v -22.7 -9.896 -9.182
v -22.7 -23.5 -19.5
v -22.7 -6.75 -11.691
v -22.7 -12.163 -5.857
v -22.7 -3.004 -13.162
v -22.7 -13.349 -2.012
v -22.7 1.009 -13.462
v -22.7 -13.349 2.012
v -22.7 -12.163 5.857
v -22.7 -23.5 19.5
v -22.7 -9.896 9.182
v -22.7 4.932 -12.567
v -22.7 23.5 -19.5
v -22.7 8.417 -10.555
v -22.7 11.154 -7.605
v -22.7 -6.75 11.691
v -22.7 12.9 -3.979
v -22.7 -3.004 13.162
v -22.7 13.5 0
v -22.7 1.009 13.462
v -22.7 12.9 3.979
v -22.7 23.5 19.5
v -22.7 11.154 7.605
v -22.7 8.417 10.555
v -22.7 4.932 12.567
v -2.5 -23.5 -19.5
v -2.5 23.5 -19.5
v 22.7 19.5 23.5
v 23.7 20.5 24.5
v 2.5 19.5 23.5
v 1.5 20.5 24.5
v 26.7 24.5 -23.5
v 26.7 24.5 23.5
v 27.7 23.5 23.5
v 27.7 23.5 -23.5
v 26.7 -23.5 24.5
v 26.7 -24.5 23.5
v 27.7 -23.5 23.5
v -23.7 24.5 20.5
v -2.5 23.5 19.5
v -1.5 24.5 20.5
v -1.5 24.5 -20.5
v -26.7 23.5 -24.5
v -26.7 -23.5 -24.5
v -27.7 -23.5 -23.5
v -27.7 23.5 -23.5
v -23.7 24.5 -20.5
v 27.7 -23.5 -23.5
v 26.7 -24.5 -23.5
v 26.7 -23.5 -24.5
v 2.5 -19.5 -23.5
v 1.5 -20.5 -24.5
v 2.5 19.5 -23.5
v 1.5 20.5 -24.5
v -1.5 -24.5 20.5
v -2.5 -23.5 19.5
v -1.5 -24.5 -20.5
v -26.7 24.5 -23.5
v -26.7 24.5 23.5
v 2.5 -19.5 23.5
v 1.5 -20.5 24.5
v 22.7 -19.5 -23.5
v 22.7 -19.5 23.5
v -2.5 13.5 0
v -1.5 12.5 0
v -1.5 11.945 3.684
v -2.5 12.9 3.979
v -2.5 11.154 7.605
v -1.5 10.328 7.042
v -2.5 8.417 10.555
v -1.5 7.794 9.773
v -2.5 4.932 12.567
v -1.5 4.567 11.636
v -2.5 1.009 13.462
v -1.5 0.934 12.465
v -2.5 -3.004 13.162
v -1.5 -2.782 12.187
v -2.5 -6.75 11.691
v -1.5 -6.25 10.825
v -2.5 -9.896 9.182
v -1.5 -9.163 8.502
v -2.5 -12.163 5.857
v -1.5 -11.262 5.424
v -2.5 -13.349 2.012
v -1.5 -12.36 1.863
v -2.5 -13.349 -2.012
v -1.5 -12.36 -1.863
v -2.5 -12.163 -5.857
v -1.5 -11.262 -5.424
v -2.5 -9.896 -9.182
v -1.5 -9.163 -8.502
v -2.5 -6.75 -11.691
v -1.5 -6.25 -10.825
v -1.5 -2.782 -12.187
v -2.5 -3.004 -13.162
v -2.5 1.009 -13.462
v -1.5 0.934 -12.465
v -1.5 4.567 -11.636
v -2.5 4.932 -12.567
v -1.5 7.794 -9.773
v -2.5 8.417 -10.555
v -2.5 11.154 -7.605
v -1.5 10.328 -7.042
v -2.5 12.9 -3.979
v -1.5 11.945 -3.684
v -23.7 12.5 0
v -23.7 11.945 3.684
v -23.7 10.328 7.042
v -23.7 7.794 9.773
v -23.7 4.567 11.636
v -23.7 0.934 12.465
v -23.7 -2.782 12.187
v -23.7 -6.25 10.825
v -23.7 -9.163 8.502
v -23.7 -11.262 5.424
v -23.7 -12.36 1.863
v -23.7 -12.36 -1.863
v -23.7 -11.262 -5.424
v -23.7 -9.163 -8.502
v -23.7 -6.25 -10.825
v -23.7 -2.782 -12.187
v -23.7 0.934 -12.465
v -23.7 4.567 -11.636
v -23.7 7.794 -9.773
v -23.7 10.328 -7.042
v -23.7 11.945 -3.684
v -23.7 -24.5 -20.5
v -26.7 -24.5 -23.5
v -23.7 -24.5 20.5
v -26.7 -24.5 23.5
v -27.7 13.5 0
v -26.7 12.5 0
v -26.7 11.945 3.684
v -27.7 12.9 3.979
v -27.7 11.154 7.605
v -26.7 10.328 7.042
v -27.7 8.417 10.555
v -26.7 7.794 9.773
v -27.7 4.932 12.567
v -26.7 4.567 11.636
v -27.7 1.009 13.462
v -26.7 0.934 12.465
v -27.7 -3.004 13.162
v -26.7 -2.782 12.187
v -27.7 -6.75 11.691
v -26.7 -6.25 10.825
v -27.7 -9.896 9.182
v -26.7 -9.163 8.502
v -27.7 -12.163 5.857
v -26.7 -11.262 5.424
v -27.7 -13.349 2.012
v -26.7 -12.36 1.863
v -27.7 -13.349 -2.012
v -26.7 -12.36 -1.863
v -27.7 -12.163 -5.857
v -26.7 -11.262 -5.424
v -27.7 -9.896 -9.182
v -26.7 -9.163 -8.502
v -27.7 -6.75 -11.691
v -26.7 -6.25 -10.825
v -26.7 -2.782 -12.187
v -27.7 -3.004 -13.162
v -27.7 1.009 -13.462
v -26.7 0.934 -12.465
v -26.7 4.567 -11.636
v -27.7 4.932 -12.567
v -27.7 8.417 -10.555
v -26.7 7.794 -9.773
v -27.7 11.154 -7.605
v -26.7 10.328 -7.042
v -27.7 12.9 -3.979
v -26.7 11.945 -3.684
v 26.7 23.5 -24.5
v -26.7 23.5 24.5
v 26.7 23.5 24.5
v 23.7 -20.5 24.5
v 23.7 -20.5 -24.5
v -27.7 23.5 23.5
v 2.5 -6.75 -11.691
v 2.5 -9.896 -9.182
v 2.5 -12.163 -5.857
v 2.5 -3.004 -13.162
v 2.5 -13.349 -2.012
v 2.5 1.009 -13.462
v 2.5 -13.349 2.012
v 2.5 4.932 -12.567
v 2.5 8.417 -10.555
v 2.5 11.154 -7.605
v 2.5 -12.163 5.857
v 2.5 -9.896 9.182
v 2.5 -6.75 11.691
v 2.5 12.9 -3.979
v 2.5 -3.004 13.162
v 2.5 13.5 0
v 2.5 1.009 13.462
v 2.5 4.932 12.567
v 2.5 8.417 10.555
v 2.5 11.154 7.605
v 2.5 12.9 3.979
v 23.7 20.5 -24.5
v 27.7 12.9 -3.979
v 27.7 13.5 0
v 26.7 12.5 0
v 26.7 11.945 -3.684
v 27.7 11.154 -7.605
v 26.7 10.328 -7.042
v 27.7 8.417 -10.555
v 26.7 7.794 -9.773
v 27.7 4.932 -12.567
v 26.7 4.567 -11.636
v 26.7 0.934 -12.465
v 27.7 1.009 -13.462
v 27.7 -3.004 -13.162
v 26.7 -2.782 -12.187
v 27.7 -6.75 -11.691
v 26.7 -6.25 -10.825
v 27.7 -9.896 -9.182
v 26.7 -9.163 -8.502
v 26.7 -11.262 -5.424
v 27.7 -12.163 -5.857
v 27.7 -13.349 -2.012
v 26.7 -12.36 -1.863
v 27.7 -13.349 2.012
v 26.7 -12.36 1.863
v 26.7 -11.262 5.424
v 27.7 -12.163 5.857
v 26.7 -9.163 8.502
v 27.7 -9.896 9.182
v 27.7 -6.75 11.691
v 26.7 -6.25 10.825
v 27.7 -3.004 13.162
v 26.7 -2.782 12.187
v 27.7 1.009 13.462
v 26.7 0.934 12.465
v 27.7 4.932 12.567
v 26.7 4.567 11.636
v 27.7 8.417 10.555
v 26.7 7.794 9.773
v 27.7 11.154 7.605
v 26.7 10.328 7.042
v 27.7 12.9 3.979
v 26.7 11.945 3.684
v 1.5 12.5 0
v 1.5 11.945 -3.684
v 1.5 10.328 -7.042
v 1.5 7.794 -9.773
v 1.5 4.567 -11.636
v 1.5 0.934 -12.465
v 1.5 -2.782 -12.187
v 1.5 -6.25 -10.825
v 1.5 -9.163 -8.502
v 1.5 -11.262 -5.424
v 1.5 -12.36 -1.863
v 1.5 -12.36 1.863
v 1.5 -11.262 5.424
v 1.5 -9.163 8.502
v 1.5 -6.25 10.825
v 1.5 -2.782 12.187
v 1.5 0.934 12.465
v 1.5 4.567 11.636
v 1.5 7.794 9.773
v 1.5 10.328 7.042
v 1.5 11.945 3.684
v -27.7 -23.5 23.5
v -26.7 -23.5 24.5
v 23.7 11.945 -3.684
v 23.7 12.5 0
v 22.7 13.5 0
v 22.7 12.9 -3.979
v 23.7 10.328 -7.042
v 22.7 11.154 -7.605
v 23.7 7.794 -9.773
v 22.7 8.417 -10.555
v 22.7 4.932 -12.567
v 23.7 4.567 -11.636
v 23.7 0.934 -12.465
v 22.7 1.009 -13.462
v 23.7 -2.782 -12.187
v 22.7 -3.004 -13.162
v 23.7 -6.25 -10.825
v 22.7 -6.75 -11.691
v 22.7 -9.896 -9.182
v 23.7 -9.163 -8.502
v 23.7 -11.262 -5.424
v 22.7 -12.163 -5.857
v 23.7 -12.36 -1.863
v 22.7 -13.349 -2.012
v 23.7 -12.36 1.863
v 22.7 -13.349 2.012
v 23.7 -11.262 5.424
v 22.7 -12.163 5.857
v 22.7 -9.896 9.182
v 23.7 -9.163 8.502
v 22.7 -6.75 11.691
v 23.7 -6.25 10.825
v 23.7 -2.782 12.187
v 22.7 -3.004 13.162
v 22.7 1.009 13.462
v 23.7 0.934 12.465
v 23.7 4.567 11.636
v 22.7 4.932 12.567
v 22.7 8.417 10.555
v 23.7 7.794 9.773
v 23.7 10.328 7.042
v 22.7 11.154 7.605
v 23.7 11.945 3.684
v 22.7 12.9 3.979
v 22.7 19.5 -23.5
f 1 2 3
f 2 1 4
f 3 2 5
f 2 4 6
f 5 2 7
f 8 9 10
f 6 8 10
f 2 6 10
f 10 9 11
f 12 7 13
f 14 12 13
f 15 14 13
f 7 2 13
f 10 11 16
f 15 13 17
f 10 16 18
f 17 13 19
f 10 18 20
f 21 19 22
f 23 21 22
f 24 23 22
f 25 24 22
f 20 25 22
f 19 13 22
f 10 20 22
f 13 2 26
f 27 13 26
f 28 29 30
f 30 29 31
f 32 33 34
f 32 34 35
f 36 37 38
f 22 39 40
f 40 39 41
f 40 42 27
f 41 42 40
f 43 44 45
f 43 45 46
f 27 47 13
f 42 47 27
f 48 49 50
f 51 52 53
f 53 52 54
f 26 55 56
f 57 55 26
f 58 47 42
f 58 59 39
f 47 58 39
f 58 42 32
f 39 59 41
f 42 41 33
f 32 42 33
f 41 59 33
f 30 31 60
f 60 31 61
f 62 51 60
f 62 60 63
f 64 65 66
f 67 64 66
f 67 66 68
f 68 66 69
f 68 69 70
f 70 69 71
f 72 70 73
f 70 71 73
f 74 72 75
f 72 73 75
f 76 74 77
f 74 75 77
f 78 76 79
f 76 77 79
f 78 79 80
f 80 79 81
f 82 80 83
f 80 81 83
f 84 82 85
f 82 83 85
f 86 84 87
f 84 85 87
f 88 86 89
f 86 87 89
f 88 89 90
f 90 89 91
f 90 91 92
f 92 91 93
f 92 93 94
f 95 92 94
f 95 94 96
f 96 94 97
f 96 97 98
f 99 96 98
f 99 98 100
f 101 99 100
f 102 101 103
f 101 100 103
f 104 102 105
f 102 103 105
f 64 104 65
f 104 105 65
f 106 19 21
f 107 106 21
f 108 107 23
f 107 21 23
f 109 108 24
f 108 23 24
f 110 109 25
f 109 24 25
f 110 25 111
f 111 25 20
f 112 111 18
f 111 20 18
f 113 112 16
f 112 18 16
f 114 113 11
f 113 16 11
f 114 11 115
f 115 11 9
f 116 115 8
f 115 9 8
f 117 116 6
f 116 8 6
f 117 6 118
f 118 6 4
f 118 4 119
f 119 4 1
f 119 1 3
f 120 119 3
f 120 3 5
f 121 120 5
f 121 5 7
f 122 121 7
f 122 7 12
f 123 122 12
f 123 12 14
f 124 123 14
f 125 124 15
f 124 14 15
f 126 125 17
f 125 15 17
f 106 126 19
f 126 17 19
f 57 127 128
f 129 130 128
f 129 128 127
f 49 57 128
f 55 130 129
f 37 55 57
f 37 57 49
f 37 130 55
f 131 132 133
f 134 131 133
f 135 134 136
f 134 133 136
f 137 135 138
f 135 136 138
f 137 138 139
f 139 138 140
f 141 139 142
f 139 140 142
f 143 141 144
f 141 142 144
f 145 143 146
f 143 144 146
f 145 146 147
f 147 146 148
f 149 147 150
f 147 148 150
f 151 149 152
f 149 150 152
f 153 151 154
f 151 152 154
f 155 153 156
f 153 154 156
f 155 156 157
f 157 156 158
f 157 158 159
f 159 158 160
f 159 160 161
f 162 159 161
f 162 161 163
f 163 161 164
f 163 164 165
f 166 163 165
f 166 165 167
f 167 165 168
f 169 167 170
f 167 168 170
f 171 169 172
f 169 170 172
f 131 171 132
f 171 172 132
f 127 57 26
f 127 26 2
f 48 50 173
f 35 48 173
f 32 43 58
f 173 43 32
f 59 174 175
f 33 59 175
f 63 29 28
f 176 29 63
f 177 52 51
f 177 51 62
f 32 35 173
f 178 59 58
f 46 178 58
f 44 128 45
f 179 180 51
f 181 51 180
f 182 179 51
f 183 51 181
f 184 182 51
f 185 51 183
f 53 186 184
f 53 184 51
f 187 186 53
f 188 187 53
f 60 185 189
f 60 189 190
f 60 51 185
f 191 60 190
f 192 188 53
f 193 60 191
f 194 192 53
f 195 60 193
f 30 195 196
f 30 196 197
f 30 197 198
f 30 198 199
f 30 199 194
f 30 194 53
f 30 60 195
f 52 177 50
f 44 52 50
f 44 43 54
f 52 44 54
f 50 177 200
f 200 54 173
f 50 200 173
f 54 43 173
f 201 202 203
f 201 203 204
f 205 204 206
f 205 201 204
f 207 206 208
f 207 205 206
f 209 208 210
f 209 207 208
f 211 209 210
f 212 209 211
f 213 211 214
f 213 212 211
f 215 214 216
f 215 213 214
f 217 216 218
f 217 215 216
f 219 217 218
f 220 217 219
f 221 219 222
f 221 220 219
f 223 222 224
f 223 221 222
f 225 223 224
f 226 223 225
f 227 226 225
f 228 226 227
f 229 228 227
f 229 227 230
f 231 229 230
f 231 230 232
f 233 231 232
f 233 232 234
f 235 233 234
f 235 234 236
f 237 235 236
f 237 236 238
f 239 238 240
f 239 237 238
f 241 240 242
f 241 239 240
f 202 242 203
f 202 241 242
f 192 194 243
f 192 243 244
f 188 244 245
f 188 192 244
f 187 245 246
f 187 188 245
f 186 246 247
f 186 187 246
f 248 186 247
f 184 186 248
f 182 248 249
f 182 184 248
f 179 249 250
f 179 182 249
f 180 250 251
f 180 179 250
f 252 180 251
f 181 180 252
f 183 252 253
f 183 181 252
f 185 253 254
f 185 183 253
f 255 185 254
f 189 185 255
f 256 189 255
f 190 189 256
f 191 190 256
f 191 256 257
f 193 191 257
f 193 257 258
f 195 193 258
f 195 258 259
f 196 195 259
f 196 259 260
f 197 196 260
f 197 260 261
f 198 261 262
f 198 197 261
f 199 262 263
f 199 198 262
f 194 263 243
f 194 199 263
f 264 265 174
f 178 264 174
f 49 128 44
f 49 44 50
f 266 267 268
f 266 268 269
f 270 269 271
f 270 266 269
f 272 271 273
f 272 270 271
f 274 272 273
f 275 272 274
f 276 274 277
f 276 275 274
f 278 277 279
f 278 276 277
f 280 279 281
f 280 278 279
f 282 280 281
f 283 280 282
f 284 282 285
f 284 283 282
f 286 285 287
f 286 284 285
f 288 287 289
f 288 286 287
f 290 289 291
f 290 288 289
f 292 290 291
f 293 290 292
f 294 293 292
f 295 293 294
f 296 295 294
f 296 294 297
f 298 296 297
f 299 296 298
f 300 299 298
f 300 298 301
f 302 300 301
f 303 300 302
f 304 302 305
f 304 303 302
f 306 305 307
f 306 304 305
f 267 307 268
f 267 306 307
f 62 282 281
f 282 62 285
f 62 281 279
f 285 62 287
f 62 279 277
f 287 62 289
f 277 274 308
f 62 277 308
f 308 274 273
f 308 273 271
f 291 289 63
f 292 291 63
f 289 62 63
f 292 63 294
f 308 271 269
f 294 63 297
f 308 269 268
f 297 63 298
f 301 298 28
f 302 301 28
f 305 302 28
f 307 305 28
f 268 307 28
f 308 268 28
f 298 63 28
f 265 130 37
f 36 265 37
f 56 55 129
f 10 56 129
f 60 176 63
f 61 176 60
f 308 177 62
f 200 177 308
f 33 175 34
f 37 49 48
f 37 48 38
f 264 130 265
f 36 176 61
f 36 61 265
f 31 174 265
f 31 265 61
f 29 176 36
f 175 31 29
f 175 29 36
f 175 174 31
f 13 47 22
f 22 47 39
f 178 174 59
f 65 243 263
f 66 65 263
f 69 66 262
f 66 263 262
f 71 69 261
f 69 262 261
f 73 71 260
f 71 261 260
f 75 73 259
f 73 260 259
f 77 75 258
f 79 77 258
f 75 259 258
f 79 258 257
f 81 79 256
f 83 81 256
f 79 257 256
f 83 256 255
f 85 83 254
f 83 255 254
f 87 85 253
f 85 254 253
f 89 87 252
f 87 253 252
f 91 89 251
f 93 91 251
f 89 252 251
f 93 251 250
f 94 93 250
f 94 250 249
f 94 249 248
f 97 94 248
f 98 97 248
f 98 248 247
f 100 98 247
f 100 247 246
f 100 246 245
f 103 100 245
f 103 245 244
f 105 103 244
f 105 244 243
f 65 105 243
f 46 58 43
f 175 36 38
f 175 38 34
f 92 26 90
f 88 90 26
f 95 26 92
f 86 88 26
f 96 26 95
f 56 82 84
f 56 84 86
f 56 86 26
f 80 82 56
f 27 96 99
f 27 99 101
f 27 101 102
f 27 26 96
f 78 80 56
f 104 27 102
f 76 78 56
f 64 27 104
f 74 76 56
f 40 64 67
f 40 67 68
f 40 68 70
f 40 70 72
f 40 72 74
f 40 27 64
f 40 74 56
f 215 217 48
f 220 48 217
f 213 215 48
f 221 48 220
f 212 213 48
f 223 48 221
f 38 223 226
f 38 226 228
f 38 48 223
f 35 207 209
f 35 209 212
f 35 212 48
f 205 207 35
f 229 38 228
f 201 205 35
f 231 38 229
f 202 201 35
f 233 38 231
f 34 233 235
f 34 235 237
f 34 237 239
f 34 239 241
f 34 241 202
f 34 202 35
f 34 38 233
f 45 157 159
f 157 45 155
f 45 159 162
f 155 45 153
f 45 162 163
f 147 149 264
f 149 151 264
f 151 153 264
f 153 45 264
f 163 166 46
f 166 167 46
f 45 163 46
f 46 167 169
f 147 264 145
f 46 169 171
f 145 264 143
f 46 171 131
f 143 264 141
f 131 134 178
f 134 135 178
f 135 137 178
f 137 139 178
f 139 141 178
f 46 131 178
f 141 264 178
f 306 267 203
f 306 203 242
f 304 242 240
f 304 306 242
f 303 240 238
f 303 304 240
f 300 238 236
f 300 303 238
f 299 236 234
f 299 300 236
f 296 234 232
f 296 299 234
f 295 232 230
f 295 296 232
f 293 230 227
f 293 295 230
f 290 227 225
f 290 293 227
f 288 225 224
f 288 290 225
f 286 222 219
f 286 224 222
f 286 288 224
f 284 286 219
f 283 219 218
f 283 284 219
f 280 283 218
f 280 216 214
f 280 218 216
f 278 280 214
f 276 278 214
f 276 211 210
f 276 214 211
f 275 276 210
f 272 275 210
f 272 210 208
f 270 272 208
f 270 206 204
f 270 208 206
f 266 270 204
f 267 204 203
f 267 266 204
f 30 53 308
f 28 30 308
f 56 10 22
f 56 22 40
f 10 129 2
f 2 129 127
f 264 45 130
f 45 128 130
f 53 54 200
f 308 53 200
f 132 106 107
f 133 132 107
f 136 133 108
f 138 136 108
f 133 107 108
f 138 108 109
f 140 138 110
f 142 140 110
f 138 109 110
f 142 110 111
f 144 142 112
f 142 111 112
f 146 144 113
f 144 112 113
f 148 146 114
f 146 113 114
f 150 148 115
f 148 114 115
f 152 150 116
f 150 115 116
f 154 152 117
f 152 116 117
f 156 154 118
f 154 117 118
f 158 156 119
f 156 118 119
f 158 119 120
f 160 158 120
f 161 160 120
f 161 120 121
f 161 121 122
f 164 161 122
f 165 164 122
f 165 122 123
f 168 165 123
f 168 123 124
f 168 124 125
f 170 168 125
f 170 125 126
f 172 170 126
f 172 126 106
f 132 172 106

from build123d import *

# Parameters (mm, degrees)
SKETCH004_W          = 55.4
SKETCH004_H          = 49
PAD001_DEPTH         = 24.5
SKETCH005_W          = 20.2
SKETCH005_H          = 39
POCKET003_DEPTH      = 24.501
POCKET003_DEPTH_BACK = 24.501
SKETCH006_W          = 20.2
SKETCH006_H          = 39
POCKET004_DEPTH      = 24.501
POCKET004_DEPTH_BACK = 24.501
SKETCH007_R          = 12.5
POCKET005_DEPTH      = 27.701
POCKET005_DEPTH_BACK = 27.701
CHAMFER001_SIZE      = 1


with BuildPart() as part:
    # Sketch004 → Pad001 (new body, symmetric)
    with BuildSketch(Plane.XY):
        Rectangle(SKETCH004_W, SKETCH004_H)
    extrude(amount=PAD001_DEPTH, both=True)

    # Sketch005 → Pocket003 (cut, two sides)
    with BuildSketch(Plane.XY) as pocket003_sk:
        with Locations((12.6, 0)):
            Rectangle(SKETCH005_W, SKETCH005_H)
    extrude(amount=-POCKET003_DEPTH, mode=Mode.SUBTRACT)
    extrude(pocket003_sk.sketch, amount=POCKET003_DEPTH_BACK, mode=Mode.SUBTRACT)

    # Sketch006 → Pocket004 (cut, two sides)
    with BuildSketch(Plane.XZ) as pocket004_sk:
        with Locations((-12.6, 0)):
            Rectangle(SKETCH006_W, SKETCH006_H)
    extrude(amount=-POCKET004_DEPTH, mode=Mode.SUBTRACT)
    extrude(pocket004_sk.sketch, amount=POCKET004_DEPTH_BACK, mode=Mode.SUBTRACT)

    # Sketch007 → Pocket005 (cut, two sides)
    with BuildSketch(Plane.YZ) as pocket005_sk:
        Circle(SKETCH007_R)
    extrude(amount=-POCKET005_DEPTH, mode=Mode.SUBTRACT)
    extrude(pocket005_sk.sketch, amount=POCKET005_DEPTH_BACK, mode=Mode.SUBTRACT)

    # Chamfer001
    chamfer001_edges = [part.edges().sort_by_distance(p)[0] for p in [
        (-27.7, -24.5, 0),
        (0, -24.5, 24.5),
        (0, -24.5, -24.5),
        (27.7, -24.5, 0),
        (27.7, 0, 24.5),
        (-27.7, 0, 24.5),
        (0, 24.5, 24.5),
        (27.7, 24.5, 0),
        (27.7, 0, -24.5),
        (27.7, -12.5, 0),
        (22.7, -12.5, 0),
        (2.5, -12.5, 0),
        (2.5, 0, 24.5),
        (12.6, -19.5, 24.5),
        (22.7, 0, 24.5),
        (12.6, 19.5, 24.5),
        (-12.6, -24.5, 19.5),
        (-22.7, -24.5, 0),
        (-12.6, -24.5, -19.5),
        (-2.5, -24.5, 0),
        (-22.7, -12.5, 0),
        (-27.7, -12.5, 0),
        (-2.5, -12.5, 0),
        (0, 24.5, -24.5),
        (-27.7, 24.5, 0),
        (-22.7, 24.5, 0),
        (-2.5, 24.5, 0),
        (-12.6, 24.5, 19.5),
        (-12.6, 24.5, -19.5),
        (-27.7, 0, -24.5),
        (2.5, 0, -24.5),
        (12.6, -19.5, -24.5),
        (12.6, 19.5, -24.5),
        (22.7, 0, -24.5),
    ]]
    chamfer(chamfer001_edges, length=CHAMFER001_SIZE)


solid = part.part
